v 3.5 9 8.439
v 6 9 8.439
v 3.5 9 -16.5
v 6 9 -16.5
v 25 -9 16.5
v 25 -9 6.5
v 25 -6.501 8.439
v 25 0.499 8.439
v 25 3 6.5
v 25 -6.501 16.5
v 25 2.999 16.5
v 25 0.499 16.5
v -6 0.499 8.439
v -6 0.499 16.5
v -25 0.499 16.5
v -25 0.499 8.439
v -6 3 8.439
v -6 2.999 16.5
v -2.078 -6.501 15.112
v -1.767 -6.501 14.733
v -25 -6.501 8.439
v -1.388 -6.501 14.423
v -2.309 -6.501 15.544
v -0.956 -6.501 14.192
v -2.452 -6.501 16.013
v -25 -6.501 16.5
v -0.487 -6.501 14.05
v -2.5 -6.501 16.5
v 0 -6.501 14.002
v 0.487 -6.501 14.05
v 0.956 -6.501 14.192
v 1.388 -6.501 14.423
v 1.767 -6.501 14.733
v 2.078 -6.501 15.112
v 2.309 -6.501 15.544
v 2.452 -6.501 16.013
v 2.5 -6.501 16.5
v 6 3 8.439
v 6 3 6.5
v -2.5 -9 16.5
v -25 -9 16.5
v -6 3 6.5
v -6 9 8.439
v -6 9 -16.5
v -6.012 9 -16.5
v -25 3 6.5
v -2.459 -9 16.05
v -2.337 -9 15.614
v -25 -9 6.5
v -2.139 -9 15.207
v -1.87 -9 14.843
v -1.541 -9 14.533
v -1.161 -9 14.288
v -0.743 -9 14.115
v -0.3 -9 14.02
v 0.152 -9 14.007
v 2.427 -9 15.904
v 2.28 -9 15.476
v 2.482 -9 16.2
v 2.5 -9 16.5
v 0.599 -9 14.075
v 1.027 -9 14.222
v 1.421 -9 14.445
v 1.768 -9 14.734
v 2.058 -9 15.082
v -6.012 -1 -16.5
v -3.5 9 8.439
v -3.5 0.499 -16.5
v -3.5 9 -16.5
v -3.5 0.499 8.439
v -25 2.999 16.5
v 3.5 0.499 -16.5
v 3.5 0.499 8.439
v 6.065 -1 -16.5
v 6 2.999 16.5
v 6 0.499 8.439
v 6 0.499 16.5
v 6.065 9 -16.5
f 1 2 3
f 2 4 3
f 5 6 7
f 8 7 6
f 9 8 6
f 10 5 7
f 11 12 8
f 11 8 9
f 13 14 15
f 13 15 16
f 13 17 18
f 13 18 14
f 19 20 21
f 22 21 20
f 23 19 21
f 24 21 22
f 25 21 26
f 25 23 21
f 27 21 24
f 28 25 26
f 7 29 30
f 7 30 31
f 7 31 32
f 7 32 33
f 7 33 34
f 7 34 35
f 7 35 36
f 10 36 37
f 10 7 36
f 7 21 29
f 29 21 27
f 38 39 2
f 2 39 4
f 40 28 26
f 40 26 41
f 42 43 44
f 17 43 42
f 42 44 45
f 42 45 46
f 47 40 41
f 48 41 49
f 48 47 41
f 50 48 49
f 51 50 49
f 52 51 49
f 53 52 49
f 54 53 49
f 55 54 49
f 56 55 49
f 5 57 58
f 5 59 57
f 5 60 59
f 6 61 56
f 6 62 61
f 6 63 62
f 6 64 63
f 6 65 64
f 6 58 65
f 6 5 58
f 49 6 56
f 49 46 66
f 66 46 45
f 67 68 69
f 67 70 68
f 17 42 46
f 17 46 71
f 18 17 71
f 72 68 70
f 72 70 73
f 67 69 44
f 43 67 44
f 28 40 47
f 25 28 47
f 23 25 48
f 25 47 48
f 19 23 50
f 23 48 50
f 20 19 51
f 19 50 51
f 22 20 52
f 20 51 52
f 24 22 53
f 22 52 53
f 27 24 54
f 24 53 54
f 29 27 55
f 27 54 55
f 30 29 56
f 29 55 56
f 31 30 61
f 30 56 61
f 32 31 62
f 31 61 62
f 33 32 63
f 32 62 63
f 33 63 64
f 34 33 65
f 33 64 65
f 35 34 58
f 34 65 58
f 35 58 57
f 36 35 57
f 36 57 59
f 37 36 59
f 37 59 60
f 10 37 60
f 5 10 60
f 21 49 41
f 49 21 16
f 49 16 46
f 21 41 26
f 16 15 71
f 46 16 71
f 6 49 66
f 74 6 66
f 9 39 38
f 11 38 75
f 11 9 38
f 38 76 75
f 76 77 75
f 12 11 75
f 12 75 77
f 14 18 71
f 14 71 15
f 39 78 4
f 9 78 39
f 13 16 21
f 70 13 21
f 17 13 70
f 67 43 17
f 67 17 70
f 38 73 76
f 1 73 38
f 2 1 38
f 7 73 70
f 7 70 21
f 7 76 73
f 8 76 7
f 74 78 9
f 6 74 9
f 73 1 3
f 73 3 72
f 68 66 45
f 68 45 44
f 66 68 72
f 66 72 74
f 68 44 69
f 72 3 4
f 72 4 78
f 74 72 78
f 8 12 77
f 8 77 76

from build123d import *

# Parameters (mm, degrees)
F1_DEPTH      = 25
F1_DEPTH_BACK = 25
F3_DEPTH      = 16.5
F3_DEPTH_BACK = 16.5
F4_DEPTH      = 8.4392210885
F4_DEPTH_BACK = 16.5
F6_D          = 5
F8_START      = -25
F8_DEPTH      = 50


with BuildPart() as f1:
    # F0 (on Right) → F1 (new body, two sides)
    with BuildSketch(Plane.YZ) as f1_sk:
        Polygon((3.0001489873, 6.5), (2.9994625902, 16.5), (0.4994625902, 16.5), (0.4994625902, 8.4392210885), (-6.5005374098, 8.4392210885), (-6.5005374098, 16.5), (-8.9995463506, 16.5), (-9.0002327559, 6.5), (-0.9999372788, -16.5), (9.0000627212, -16.5), align=None)
    extrude(amount=F1_DEPTH)
    extrude(f1_sk.sketch, amount=-F1_DEPTH_BACK)

    # F2 (on Top) → F3 (cut, two sides)
    with BuildSketch(Plane.XY) as f3_sk:
        Polygon((-3.5, 9.0000627212), (-6, 9.0000627212), (-6, 0.4994625902), (-3.5, 0.4994625902), (-3.5, 3.0001489873), align=None)
        Polygon((3.5, 9.0000627212), (-3.5, 9.0000627212), (-3.5, 3.0001489873), (-3.5, 0.4994625902), (3.5, 0.4994625902), (3.5, 3.0001489873), align=None)
        Polygon((6, 9.0000627212), (3.5, 9.0000627212), (3.5, 3.0001489873), (3.5, 0.4994625902), (6, 0.4994625902), align=None)
    extrude(amount=F3_DEPTH, mode=Mode.SUBTRACT)
    extrude(f3_sk.sketch, amount=-F3_DEPTH_BACK, mode=Mode.SUBTRACT)

    # F2 (on Top) → F4 (join, two sides)
    with BuildSketch(Plane.XY) as f4_sk:
        Polygon((-3.5, 9.0000627212), (-6, 9.0000627212), (-6, 0.4994625902), (-3.5, 0.4994625902), (-3.5, 3.0001489873), align=None)
        Polygon((6, 9.0000627212), (3.5, 9.0000627212), (3.5, 3.0001489873), (3.5, 0.4994625902), (6, 0.4994625902), align=None)
    extrude(amount=F4_DEPTH)
    extrude(f4_sk.sketch, amount=-F4_DEPTH_BACK)

    # F6 (through all)
    with Locations(Plane(origin=(0, 0, 0), x_dir=(1, 0, 0), z_dir=(0, 1, 0))):
        with Locations((0, -16.5018886328)):
            Hole(F6_D / 2)

    # F7 (on Front) → F8 (intersect)
    with BuildSketch(Plane.XZ.offset(F8_START)):
        Polygon((6.0645495541, -16.5), (25, 6.5), (25, 17.2385324479), (-25, 17.2385324479), (-25, 6.5), (-6.0119125992, -16.5), align=None)
    extrude(amount=F8_DEPTH, mode=Mode.INTERSECT)


solid = f1.part
